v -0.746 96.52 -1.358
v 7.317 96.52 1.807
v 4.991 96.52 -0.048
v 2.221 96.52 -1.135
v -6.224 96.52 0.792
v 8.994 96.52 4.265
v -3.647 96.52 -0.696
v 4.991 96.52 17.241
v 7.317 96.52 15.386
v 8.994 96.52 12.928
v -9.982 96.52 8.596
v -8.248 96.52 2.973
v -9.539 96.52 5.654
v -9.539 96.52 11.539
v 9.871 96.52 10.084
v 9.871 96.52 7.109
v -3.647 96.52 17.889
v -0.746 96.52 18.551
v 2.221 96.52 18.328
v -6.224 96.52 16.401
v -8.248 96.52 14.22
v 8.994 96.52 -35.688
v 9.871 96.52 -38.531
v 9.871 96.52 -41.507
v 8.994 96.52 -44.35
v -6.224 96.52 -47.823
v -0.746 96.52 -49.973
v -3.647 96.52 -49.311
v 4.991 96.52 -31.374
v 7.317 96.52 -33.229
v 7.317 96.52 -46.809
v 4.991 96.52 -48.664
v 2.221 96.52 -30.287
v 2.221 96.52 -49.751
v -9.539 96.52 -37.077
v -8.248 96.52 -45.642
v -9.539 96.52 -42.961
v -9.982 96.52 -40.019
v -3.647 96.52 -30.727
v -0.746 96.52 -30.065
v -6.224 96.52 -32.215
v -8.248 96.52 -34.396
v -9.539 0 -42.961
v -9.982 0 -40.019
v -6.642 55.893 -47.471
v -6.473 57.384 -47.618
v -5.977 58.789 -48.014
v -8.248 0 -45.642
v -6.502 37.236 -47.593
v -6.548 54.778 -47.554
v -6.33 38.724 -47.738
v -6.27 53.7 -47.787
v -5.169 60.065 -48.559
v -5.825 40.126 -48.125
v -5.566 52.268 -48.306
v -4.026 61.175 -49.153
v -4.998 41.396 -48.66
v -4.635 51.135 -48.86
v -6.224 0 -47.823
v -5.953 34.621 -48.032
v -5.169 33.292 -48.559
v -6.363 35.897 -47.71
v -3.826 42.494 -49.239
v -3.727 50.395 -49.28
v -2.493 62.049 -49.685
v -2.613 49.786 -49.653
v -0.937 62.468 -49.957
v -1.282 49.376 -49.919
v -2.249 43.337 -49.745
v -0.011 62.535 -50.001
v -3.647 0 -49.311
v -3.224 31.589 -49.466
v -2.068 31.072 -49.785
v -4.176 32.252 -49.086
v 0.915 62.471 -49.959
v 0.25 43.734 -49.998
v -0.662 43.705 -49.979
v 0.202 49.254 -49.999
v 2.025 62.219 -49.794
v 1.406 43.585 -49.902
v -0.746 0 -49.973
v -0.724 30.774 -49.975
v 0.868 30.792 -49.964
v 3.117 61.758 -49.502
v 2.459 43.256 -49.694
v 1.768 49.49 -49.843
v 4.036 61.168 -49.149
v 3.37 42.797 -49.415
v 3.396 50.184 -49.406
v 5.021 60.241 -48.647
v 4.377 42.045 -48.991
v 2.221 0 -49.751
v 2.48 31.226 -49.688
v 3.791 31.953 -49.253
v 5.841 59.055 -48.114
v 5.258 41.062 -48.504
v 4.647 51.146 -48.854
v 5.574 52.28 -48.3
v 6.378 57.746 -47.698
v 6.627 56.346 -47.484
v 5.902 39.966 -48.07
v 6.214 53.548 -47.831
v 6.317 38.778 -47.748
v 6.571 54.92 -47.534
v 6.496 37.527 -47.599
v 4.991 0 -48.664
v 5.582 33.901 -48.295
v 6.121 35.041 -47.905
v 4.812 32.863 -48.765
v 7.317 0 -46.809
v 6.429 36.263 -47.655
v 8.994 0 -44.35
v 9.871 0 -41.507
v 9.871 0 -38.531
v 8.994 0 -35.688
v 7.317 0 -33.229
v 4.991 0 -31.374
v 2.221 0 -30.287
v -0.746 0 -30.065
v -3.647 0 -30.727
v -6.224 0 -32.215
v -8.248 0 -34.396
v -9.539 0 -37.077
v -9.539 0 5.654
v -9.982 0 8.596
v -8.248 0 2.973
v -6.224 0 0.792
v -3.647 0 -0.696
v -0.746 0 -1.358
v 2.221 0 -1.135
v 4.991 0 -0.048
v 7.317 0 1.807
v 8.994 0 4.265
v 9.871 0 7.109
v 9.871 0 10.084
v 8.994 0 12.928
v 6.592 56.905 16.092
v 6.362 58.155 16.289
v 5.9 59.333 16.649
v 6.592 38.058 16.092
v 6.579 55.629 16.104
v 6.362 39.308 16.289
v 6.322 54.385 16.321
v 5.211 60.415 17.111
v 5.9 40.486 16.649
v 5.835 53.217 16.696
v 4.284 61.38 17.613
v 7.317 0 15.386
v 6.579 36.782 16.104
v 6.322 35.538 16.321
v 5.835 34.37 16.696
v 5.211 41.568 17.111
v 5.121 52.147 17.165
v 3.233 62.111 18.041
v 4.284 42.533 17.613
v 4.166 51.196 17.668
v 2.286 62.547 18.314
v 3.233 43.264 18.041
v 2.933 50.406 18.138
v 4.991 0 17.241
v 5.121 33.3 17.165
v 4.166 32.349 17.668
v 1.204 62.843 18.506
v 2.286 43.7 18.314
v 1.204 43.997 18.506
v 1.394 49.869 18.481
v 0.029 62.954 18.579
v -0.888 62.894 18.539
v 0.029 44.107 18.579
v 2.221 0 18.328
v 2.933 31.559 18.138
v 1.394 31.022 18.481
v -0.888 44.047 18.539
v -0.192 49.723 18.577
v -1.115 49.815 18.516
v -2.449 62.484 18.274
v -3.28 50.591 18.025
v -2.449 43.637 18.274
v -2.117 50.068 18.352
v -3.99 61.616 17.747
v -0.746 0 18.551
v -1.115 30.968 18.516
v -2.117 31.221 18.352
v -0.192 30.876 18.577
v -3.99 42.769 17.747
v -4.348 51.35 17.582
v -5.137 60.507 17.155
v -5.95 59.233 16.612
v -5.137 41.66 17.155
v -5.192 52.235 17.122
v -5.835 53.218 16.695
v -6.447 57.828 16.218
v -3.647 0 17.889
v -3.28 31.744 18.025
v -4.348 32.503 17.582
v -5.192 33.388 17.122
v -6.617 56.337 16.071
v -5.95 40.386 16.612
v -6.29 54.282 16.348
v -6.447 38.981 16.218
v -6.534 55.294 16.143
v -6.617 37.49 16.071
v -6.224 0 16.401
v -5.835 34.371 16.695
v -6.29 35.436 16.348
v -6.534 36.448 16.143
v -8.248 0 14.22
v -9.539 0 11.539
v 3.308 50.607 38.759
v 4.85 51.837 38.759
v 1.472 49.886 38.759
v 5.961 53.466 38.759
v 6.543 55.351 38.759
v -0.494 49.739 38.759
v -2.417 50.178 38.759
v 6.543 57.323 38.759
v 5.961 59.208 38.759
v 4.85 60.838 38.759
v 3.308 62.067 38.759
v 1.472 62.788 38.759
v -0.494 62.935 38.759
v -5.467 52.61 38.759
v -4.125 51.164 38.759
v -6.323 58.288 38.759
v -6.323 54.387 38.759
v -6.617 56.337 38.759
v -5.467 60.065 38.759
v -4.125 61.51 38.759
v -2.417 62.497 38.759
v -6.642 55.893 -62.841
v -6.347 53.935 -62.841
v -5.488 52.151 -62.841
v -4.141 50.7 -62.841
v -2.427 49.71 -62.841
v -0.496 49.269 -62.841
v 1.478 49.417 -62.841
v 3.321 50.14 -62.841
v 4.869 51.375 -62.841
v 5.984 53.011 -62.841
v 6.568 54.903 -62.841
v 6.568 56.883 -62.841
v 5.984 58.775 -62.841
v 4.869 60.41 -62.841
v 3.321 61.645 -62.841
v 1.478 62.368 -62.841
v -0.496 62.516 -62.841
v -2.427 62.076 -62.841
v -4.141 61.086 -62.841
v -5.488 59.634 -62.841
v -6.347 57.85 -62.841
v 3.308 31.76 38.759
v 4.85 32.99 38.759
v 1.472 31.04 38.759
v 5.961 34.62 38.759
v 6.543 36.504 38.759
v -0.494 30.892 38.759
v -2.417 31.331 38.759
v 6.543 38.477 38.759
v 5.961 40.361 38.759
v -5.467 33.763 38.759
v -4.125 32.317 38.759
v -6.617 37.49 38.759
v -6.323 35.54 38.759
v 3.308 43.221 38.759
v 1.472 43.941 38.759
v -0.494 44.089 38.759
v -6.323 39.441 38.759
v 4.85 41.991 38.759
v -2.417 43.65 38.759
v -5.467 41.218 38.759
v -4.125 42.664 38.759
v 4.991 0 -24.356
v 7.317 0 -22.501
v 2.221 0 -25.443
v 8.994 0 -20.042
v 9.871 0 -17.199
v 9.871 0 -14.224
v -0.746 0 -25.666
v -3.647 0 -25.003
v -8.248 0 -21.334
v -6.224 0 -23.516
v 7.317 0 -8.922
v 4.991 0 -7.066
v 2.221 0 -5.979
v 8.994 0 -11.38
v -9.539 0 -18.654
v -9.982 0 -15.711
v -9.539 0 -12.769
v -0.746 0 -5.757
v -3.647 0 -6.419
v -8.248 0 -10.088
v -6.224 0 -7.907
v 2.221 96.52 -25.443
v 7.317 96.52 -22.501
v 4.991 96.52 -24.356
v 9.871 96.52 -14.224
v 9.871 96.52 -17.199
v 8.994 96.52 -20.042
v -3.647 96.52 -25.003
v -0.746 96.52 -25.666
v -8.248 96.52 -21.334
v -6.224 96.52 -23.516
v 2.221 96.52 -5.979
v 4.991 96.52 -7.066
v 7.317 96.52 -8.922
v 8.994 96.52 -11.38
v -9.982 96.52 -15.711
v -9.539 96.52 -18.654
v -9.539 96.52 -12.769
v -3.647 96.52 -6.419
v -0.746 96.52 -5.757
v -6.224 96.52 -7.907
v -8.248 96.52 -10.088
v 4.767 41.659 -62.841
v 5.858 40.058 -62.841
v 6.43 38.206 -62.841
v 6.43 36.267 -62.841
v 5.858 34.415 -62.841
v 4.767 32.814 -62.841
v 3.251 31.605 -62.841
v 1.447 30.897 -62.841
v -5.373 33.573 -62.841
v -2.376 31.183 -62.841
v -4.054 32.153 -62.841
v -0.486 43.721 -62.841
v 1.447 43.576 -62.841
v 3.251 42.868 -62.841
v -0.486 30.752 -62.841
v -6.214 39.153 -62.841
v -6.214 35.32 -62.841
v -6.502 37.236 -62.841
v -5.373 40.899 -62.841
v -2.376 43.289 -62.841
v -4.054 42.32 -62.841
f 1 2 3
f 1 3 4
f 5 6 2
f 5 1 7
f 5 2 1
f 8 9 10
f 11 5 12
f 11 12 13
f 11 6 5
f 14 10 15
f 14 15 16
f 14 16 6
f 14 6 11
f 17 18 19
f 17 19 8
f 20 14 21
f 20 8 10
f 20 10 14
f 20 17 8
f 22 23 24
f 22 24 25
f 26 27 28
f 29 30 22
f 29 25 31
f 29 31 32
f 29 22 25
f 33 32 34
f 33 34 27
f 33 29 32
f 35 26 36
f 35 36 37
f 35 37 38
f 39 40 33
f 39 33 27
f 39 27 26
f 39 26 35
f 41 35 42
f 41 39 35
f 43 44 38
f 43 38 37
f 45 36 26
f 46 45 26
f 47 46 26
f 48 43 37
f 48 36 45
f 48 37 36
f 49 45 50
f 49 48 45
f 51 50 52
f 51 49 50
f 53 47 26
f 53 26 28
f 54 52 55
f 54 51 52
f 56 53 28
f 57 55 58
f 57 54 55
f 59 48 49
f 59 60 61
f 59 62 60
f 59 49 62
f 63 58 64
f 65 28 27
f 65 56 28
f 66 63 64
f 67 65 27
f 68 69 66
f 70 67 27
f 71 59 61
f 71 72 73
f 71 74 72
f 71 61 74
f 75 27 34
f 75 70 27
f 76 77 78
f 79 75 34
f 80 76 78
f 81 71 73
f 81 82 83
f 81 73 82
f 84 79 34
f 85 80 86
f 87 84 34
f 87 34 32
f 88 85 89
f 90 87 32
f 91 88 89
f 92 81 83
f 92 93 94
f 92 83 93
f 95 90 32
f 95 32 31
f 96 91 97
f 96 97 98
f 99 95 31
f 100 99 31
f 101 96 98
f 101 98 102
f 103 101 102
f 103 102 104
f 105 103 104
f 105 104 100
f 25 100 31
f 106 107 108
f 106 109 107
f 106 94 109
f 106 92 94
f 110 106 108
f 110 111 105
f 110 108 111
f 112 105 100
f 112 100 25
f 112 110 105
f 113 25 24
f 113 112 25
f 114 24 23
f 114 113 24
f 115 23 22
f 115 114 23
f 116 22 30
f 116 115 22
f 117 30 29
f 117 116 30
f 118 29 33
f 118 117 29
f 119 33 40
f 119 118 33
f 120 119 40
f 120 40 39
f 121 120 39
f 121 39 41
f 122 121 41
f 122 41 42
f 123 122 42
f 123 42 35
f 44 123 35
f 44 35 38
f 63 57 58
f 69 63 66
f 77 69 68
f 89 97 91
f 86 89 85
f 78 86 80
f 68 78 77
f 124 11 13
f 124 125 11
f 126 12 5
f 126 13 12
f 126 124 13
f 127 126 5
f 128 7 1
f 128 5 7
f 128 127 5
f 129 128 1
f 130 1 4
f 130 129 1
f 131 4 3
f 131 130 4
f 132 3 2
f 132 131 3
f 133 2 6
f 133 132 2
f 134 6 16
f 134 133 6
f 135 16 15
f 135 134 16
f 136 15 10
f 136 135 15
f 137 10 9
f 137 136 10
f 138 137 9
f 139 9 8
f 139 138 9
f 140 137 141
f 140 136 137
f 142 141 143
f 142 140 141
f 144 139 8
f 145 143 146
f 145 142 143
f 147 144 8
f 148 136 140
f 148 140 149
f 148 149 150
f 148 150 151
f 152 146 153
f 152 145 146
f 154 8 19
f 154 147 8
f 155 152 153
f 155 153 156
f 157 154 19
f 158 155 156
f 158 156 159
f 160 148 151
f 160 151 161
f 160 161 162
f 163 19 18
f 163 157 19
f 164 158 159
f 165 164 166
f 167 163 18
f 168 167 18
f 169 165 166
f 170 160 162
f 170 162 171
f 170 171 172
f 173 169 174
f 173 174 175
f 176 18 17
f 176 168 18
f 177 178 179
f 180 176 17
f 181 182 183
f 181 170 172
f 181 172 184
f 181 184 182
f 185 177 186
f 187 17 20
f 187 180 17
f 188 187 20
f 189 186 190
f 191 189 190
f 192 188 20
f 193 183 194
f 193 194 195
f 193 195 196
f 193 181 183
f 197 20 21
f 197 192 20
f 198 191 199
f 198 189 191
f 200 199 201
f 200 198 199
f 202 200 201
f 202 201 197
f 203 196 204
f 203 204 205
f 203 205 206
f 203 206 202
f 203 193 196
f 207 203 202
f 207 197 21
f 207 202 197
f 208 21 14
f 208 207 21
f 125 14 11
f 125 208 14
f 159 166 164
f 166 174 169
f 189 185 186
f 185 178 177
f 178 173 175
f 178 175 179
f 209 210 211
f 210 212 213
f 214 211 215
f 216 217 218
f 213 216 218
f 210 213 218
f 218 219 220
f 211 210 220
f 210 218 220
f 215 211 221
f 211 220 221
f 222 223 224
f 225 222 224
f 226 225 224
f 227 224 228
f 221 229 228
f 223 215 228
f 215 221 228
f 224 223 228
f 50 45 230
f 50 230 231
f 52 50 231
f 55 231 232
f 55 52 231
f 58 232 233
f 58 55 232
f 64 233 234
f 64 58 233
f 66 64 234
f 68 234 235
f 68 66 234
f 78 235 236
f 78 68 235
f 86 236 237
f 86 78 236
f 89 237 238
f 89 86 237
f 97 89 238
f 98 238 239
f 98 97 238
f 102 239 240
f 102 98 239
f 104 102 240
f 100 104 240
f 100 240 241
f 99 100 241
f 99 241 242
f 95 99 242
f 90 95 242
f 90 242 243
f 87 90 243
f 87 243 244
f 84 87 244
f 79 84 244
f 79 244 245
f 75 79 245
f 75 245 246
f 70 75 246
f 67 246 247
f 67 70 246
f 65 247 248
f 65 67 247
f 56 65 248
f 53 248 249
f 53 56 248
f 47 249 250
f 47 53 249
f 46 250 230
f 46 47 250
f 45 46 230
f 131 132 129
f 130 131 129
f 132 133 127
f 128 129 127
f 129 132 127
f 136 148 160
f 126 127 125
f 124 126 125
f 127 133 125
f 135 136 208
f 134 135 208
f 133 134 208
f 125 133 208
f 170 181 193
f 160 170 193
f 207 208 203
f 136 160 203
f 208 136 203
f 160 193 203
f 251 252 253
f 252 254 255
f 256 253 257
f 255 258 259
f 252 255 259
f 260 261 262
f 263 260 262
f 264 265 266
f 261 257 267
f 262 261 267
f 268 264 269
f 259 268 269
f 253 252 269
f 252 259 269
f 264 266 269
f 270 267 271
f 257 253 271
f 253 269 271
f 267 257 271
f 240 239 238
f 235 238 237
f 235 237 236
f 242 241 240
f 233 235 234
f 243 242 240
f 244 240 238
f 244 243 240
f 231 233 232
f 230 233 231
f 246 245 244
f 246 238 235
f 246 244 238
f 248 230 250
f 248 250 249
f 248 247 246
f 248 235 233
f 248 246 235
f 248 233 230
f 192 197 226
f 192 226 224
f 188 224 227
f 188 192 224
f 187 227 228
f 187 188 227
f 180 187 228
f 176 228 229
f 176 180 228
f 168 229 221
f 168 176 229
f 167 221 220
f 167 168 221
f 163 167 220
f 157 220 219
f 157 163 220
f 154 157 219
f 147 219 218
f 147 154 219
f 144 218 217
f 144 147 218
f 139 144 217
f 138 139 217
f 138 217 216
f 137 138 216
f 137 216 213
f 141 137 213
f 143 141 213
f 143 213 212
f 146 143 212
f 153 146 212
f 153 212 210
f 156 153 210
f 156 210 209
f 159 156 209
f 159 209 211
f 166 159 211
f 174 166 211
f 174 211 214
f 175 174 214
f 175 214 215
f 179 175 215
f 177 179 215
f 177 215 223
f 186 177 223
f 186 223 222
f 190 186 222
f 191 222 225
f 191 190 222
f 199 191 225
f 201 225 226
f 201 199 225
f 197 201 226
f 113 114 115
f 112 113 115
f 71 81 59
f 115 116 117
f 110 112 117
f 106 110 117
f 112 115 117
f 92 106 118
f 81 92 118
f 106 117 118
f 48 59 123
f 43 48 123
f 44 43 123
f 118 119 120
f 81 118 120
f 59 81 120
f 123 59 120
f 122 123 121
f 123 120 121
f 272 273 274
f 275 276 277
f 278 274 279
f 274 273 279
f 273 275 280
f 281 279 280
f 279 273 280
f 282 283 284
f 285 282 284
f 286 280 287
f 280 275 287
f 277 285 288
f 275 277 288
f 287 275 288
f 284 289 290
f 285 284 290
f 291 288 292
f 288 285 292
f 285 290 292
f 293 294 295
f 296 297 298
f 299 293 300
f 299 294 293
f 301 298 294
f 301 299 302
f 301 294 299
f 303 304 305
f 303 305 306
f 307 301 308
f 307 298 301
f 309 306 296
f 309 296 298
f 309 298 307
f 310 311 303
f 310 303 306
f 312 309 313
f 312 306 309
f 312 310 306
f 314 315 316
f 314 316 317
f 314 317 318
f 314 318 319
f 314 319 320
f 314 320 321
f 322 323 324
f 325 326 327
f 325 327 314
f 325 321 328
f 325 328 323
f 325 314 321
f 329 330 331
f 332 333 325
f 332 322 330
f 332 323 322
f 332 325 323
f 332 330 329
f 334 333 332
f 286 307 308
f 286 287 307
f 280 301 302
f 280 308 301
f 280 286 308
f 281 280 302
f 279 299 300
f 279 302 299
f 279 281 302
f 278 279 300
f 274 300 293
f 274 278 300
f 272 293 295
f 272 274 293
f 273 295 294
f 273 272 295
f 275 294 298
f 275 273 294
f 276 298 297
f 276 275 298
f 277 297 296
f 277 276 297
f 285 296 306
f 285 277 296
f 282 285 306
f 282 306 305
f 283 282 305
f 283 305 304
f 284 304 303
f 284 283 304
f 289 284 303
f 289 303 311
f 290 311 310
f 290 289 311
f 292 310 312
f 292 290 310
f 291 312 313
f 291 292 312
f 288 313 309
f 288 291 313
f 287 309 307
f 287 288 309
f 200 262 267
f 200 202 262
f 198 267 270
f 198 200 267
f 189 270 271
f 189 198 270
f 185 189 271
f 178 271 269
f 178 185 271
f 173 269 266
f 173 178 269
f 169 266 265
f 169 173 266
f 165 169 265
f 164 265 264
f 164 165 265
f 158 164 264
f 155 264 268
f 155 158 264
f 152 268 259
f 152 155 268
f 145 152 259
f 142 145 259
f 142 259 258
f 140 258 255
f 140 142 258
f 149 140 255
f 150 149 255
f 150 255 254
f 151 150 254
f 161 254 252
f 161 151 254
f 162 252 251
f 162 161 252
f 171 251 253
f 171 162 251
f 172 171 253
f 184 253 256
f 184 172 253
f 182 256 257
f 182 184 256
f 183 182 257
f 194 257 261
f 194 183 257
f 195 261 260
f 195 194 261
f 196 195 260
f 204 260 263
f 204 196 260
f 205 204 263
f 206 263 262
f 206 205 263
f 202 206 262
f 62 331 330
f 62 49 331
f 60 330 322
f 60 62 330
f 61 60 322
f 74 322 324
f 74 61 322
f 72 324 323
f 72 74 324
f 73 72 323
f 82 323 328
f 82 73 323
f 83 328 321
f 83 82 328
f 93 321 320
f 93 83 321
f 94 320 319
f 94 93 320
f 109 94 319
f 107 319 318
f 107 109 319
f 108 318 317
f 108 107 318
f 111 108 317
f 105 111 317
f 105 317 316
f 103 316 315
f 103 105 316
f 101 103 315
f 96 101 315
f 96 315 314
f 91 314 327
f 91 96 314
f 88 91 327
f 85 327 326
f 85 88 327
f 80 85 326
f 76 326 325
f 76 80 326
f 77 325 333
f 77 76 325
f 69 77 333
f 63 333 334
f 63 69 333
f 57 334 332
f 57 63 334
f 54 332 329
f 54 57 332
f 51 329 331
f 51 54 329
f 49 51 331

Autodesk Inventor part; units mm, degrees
ref_plane "YZ Plane" through (0, 0, 0) normal (1, 0, 0) x (0, 1, 0)
ref_plane "XZ Plane" through (0, 0, 0) normal (0, 1, 0) x (-1, 0, 0)
ref_plane "XY Plane" through (0, 0, 0) normal (0, 0, 1) x (1, 0, 0)
sketch "Sketch1" plane through (0, 0, 0) normal (0, 1, 0) x (-1, 0, 0)
  circle A0 centre (0, 8.5965) radius 9.9822
  circle A1 centre (0, -40.0191) radius 9.9822
  circle A2 centre (0, -15.7113) radius 9.9822
  point P0 (0, 0)
  dimension "d0" = 19.9644
  dimension "d2" = 19.9644
  dimension "d4" = 19.9644
extrude "Extrusion1" add sketch "Sketch1" along normal blind 96.52
ref_plane "Work Plane1" through (0, 48.26, -15.7113) normal (0, 1, 0) x (1, 0, 0)
ref_plane "Work Plane2" through (0, 96.52, 8.5965) normal (-1, 0, 0) x (0, 1, 0)
sketch "Sketch2" plane through (0, 96.52, 8.5965) normal (-1, 0, 0) x (0, 1, 0)
  line L0 (-66.6496, -34.925) -> (-66.6496, 3.175)
  line L1 (-66.6496, 3.175) -> (-34.5694, 3.175)
  line L2 (-34.5694, 3.175) -> (-34.5694, -34.925)
  line L3 (-96.52, -9.9822) -> (-96.52, 9.9822) projected
  line L4 (-34.5694, -34.925) -> (-47.8028, -34.925)
  line L5 (-47.8028, -34.925) -> (-47.8028, -1.5875)
  line L6 (-47.8028, -1.5875) -> (-34.5694, -1.5875)
  line L7 (-34.5694, -1.5875) -> (-34.5694, -34.925)
  line L8 (-66.6496, -34.925) -> (-53.4162, -34.925)
  line L9 (-53.4162, -34.925) -> (-53.4162, 4.7625)
  line L10 (-53.4162, 4.7625) -> (-66.6496, 4.7625)
  line L11 (-66.6496, 4.7625) -> (-66.6496, -34.925)
  line L12 (-34.5694, -34.925) -> (-47.8028, -34.925)
  line L13 (-53.4162, -34.925) -> (-66.6496, -34.925)
  line L14 (-60.0329, -34.925) -> (-60.0329, -4.7625)
  line L15 (-60.0329, -34.925) -> (-29.8704, -34.925) construction
  line L16 (-41.1861, -34.925) -> (-41.1861, -1.5875)
  point P0 (-96.52, 8.5965)
  dimension "d7" = 32.0802
  dimension "d8" = 29.8704
  dimension "d9" = 13.2334
  dimension "d10" = 13.2334
  dimension "d11" = 90
ref_plane "Work Plane3" through (0, 36.4871, 13.359) normal (0, 1, 0) x (-1, 0, 0)
ref_plane "Work Plane4" through (0, 36.4871, 13.359) normal (0, 0, -1) x (-1, 0, 0)
sketch "Sketch3" plane through (0, 36.4871, 13.359) normal (0, 0, -1) x (-1, 0, 0)
  circle A0 centre (0, 19.8501) radius 6.6167
  circle A1 centre (0, 1.0033) radius 6.6167
  line L0 (9.9822, -36.4871) -> (-9.9822, -36.4871) projected
  point P0 (0, -36.4871)
  dimension "d12" = 13.2334
  dimension "d13" = 13.2334
  dimension "d14" = 18.8468
  dimension "d15" = 37.4904
extrude "Extrusion2" add sketch "Sketch3" against normal blind 25.4
ref_plane "Work Plane5" through (0, 36.4871, -37.441) normal (0, 0, -1) x (-1, 0, 0)
sketch "Sketch4" plane through (0, 36.4871, -37.441) normal (0, 0, -1) x (-1, 0, 0)
  circle A0 centre (0, 0.7493) radius 6.5024
  line L0 (9.9822, -36.4871) -> (-9.9822, -36.4871) projected
  circle A1 centre (0, 19.4056) radius 6.6421
  point P0 (0, -36.4871)
  dimension "d19" = 13.0048
  dimension "d20" = 37.2364
  dimension "d21" = 13.2842
  dimension "d22" = 18.6563
extrude "Extrusion3" add sketch "Sketch4" along normal blind 25.4
sketch "Sketch5" plane through (0, 36.4871, 13.359) normal (0, 1, 0) x (-1, 0, 0)
  line L0 (-24.3242, 48.3513) -> (-17.297, 48.3513) construction
  line L1 (-17.297, 48.3513) -> (-17.297, 45.0959) construction
  line L2 (-17.297, 45.0959) -> (-24.3242, 45.0959) construction
  line L3 (-24.3242, 45.0959) -> (-24.3242, 48.3513) construction
  point P0 (0, -13.359)
properties part number "Valves"
